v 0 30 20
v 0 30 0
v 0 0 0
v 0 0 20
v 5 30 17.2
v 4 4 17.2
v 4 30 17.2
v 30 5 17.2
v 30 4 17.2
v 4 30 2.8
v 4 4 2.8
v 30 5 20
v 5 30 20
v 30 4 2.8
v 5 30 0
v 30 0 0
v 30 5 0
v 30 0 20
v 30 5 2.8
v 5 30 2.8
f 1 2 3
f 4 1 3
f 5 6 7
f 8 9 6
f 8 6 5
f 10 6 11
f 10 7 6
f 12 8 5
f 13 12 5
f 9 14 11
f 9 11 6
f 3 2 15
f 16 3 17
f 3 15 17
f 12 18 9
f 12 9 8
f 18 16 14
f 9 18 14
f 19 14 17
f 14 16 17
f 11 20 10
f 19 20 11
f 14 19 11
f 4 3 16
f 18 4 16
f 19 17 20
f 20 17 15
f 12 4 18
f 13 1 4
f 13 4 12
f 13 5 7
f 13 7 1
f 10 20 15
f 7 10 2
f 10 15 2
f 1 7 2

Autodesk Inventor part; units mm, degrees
ref_plane "YZ Plane" through (0, 0, 0) normal (1, 0, 0) x (0, 1, 0)
ref_plane "XZ Plane" through (0, 0, 0) normal (0, 1, 0) x (-1, 0, 0)
ref_plane "XY Plane" through (0, 0, 0) normal (0, 0, 1) x (1, 0, 0)
sketch "スケッチ1" plane through (0, 0, 0) normal (0, 0, 1) x (1, 0, 0)
  line L0 (0, 0) -> (30, 0)
  line L1 (30, 0) -> (30, 5)
  line L2 (30, 5) -> (5, 30)
  line L3 (5, 30) -> (0, 30)
  line L4 (0, 30) -> (0, 0)
  dimension "d0" = 30
  dimension "d1" = 30
  dimension "d2" = 5
extrude "押し出し1" add sketch "スケッチ1" along normal blind 20
sketch "スケッチ2" plane through (30, 0, 0) normal (1, 0, 0) x (0, 0, -1)
  line L0 (0, 30) -> (-20, 30) projected
  line L1 (-17.2, 30) -> (-2.8, 30)
  line L2 (-2.8, 30) -> (-2.8, 4)
  line L3 (-2.8, 4) -> (-17.2, 4)
  line L4 (-17.2, 4) -> (-17.2, 30)
  line L5 (0, 0) -> (-20, 0) projected
  line L6 (0, 30) -> (0, 0) projected
  line L7 (-20, 5) -> (-20, 30) projected
  dimension "d5" = 4
  dimension "d6" = 2.8
  dimension "d7" = 2.8
extrude "押し出し2" cut sketch "スケッチ2" against normal blind 26
properties part number "ブラケット2"
